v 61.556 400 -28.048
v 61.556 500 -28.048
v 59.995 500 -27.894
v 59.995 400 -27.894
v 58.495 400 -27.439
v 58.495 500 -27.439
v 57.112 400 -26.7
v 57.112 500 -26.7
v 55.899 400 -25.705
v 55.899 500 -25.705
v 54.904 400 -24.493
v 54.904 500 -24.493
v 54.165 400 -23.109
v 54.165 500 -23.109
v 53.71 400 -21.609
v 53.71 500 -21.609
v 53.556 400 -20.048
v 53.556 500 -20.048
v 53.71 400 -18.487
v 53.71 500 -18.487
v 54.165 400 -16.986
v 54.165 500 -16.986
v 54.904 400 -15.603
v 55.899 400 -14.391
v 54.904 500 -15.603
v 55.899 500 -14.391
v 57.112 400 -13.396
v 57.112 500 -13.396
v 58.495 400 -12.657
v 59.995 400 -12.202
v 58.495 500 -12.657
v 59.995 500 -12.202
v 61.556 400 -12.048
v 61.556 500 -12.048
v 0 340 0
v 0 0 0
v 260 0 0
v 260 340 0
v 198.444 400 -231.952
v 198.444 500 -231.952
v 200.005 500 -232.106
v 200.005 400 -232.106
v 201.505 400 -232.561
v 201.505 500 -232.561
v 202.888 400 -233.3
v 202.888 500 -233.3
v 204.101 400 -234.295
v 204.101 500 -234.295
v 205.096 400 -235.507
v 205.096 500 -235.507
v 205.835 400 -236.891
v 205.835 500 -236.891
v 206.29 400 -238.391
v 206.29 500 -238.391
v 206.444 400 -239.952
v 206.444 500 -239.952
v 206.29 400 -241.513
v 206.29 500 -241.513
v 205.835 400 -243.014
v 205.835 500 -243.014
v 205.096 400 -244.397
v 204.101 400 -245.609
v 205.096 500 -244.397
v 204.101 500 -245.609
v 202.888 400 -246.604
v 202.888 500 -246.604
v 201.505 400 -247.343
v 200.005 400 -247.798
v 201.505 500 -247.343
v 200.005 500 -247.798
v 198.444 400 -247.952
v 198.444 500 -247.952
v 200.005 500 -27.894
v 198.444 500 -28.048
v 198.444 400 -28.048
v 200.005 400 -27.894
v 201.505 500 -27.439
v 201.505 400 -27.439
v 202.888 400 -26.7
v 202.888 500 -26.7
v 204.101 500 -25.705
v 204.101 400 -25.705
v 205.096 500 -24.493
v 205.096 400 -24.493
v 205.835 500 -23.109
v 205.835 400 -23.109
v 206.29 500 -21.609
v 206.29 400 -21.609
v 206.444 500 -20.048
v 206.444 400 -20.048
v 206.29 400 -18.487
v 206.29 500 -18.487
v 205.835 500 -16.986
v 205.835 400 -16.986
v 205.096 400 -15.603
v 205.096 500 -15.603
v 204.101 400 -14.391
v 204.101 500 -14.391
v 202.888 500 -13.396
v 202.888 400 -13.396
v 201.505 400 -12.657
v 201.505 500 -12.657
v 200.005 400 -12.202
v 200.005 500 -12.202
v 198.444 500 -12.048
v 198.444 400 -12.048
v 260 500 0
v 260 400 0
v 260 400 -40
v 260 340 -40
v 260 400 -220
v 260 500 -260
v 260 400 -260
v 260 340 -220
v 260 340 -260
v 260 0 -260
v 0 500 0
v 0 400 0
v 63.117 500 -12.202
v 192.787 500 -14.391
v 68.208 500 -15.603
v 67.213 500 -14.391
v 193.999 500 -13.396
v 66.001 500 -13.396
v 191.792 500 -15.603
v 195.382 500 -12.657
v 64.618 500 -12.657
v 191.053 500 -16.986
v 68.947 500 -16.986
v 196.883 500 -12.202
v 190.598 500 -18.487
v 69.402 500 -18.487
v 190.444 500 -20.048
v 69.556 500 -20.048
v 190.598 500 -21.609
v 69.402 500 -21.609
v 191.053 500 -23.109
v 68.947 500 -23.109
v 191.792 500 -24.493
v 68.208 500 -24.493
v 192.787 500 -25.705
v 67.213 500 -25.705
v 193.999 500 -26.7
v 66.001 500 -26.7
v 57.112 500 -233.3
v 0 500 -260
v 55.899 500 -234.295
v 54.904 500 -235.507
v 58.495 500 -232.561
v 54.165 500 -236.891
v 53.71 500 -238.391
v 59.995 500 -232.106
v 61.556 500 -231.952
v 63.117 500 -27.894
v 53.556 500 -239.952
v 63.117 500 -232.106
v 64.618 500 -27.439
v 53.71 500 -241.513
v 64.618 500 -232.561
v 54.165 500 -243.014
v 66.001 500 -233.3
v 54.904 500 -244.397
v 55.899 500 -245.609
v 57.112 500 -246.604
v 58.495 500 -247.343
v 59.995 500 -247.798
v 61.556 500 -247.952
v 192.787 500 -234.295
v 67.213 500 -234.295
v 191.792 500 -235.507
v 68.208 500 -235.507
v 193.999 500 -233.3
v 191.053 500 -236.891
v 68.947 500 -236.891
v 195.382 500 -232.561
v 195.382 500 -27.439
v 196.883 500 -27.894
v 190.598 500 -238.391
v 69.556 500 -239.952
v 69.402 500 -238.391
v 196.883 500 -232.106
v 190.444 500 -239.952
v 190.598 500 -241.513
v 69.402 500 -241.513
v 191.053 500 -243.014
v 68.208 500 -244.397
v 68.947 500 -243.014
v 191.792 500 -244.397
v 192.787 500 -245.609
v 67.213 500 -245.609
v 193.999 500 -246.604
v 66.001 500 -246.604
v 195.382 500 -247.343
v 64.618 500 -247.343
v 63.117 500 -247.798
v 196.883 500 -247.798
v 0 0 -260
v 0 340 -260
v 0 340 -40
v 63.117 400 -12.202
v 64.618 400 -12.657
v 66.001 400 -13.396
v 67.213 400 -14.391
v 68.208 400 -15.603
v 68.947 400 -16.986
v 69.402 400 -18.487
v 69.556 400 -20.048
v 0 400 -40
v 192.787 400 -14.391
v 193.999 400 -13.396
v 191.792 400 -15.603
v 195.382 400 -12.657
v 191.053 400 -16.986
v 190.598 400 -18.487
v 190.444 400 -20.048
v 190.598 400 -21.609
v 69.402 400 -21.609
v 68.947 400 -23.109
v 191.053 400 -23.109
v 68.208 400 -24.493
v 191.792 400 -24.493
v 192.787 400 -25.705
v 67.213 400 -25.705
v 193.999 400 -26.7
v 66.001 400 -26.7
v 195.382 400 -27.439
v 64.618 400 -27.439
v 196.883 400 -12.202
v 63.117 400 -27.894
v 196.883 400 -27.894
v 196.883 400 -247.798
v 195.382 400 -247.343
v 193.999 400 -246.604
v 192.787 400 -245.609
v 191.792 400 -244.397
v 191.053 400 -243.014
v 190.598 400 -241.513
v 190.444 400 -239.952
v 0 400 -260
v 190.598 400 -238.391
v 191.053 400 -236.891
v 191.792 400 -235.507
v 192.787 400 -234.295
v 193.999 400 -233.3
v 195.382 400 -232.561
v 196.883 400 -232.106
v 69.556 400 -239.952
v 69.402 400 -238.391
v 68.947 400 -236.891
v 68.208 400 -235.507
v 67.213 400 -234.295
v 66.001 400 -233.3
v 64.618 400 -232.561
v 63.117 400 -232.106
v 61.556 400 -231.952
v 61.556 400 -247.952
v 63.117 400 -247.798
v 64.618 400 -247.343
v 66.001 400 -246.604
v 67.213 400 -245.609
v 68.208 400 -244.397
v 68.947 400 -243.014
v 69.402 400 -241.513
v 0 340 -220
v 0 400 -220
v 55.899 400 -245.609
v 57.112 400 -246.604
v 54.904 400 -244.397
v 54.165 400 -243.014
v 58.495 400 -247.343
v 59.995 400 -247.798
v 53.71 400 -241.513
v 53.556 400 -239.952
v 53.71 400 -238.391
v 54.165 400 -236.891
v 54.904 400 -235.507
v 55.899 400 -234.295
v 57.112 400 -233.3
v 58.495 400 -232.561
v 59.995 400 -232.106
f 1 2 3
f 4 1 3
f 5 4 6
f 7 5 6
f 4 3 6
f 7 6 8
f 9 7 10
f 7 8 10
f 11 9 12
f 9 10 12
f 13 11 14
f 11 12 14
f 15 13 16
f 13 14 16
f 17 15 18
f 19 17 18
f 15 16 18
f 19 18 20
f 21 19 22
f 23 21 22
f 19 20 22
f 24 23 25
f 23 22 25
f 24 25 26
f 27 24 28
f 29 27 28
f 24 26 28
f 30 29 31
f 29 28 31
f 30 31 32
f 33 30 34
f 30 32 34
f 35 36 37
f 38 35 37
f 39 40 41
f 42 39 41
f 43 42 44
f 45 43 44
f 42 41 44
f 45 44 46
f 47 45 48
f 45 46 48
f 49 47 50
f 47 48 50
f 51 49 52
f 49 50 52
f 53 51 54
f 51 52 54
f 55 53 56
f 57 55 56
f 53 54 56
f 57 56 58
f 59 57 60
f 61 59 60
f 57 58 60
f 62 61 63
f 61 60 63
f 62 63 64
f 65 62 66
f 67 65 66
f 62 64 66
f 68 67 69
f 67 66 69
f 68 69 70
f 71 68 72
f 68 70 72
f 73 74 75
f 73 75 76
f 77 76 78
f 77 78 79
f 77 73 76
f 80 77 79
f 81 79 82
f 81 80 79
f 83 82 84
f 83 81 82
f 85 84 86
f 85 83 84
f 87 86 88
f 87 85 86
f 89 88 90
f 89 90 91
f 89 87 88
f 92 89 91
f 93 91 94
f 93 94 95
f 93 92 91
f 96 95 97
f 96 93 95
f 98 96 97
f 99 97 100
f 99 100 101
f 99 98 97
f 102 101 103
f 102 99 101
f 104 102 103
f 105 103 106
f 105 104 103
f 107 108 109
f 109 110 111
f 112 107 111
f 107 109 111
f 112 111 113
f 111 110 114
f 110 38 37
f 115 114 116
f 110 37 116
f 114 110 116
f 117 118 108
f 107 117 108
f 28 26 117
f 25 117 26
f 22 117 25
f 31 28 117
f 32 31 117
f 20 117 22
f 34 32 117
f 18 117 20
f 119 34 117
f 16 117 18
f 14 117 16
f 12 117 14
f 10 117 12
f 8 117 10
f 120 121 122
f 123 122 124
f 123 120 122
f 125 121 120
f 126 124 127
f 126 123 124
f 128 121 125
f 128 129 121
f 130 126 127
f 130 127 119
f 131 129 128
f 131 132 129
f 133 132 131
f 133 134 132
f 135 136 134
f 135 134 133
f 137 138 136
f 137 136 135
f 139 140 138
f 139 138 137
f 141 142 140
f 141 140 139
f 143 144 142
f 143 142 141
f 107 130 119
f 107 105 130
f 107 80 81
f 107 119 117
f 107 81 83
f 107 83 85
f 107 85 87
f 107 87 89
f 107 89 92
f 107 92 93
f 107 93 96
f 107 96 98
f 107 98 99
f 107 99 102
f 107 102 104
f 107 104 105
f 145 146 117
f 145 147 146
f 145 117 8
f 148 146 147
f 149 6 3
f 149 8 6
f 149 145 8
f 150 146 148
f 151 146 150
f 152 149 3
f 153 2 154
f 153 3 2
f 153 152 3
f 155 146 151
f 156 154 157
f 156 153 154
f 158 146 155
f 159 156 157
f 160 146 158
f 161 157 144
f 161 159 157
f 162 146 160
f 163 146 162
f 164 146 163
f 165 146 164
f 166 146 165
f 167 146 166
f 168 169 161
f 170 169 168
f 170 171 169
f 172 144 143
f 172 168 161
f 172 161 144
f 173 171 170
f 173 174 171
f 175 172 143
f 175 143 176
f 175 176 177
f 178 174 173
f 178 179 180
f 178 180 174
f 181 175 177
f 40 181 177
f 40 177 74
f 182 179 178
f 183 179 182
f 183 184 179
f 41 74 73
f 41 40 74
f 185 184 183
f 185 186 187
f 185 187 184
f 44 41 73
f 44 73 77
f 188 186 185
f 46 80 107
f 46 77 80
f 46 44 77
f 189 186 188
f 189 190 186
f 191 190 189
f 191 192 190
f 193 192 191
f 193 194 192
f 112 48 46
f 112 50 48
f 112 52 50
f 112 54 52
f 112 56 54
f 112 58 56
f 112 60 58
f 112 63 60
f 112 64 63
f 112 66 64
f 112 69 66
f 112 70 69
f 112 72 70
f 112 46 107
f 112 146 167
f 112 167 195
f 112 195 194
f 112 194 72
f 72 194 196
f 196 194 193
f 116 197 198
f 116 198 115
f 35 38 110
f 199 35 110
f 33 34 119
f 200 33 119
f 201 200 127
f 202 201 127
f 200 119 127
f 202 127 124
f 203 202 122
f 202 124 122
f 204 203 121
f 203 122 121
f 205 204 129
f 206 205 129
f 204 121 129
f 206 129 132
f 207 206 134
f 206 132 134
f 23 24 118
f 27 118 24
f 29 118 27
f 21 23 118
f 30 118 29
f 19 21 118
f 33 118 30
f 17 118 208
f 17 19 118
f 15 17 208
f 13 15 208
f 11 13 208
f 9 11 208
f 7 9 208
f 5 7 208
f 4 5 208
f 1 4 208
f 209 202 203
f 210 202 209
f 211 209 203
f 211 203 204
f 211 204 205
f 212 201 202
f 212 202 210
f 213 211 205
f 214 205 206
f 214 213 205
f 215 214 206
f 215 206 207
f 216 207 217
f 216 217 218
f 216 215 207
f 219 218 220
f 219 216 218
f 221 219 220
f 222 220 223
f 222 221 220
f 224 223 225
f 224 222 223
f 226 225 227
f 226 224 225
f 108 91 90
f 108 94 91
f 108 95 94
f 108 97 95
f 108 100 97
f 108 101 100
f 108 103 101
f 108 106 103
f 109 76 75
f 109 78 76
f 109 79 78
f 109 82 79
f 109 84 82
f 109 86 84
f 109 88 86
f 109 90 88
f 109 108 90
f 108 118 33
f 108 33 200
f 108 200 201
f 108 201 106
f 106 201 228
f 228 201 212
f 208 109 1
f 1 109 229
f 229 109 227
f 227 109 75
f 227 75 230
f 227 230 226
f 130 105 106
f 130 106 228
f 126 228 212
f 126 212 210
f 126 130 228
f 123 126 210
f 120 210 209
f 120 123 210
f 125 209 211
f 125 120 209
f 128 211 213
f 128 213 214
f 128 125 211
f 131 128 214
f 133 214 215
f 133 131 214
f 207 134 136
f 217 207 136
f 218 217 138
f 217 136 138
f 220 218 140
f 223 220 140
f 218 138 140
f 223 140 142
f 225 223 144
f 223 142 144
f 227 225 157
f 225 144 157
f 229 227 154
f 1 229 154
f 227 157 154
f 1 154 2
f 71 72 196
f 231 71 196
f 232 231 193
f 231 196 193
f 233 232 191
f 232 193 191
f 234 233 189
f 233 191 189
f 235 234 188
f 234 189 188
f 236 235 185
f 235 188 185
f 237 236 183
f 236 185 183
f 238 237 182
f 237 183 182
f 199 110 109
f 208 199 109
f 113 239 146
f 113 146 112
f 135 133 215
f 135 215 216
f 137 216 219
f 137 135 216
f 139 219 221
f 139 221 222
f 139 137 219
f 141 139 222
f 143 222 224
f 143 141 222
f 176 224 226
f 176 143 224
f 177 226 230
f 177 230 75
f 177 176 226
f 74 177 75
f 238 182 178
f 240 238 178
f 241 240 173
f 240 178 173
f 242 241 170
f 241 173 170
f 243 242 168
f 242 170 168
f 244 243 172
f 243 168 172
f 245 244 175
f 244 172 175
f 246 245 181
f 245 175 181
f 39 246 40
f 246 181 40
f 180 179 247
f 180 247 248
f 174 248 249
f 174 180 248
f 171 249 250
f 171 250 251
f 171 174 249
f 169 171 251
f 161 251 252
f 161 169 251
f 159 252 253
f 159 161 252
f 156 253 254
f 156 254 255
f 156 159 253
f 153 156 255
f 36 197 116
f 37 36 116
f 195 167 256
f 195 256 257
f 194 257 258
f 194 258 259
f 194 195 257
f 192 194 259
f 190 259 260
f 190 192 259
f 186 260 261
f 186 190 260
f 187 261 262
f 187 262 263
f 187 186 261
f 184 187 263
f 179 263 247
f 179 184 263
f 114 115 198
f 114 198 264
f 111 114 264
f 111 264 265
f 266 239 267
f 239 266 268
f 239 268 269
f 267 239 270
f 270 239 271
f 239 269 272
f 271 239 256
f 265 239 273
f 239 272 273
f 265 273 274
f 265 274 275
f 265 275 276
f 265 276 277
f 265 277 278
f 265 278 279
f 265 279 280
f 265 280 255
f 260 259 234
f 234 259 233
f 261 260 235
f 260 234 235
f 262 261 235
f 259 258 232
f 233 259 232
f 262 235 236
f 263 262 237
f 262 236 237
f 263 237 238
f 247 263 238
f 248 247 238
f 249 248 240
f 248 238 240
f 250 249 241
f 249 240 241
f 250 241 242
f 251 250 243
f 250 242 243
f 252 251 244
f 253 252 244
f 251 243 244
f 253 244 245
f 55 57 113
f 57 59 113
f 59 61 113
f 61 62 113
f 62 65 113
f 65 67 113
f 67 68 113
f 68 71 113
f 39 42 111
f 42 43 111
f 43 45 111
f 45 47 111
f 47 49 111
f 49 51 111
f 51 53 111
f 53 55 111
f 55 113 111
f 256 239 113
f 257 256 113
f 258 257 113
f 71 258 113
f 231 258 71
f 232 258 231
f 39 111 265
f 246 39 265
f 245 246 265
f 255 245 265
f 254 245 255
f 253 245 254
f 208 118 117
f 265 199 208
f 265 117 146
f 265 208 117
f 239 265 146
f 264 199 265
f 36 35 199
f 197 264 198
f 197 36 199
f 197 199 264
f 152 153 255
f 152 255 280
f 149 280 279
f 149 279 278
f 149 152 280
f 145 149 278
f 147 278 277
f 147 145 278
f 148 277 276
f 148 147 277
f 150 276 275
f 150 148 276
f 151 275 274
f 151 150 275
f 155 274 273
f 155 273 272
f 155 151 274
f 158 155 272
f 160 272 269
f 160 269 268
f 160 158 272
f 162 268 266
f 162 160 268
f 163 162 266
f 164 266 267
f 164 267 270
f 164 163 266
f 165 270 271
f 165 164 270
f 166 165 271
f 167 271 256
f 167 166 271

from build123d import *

# Parameters (mm, degrees)
SKETCH2_W            = 260
SKETCH2_H            = 260
BOSS_EXTRUDE1_DEPTH  = 500
SKETCH4_W            = 40
SKETCH4_H            = 60
CUT_EXTRUDE1_DEPTH   = 621.644825967
CUT_EXTRUDE2_REACH   = 622.645
MIRROR2_COPY_1_REACH = 622.645


with BuildPart() as part:
    # Sketch2 → Boss-Extrude1 (new body)
    with BuildSketch(Plane(origin=(0, 0, 0), x_dir=(1, 0, 0), z_dir=(0, 1, 0))):
        with Locations((130, 130)):
            Rectangle(SKETCH2_W, SKETCH2_H)
    extrude(amount=BOSS_EXTRUDE1_DEPTH)

    # Sketch4 → Cut-Extrude1 (cut, symmetric)
    with BuildSketch(Plane(origin=(260, 0, 0), x_dir=(0, 0, -1), z_dir=(1, 0, 0))):
        with Locations((20, 370)):
            Rectangle(SKETCH4_W, SKETCH4_H)
    cut_extrude1 = extrude(amount=CUT_EXTRUDE1_DEPTH, both=True, mode=Mode.SUBTRACT)

    # Sketch5 → Cut-Extrude2 (cut, up to next)
    with BuildSketch(Plane(origin=(0, 500, 0), x_dir=(1, 0, 0), z_dir=(0, 1, 0)), mode=Mode.PRIVATE) as cut_extrude2_sk1:
        with BuildLine():
            ThreePointArc((69.556138468, 20.047965883), (67.212992718, 25.704820132), (61.556138468, 28.047965883))
            Line((61.556138468, 28.047965883), (61.556138468, 20.047965883))
            Line((61.556138468, 20.047965883), (61.556138468, 12.047965883))
            ThreePointArc((61.556138468, 12.047965883), (67.212992718, 14.391111633), (69.556138468, 20.047965883))
        make_face()
    cut_extrude2_tool1 = extrude(cut_extrude2_sk1.sketch, amount=-CUT_EXTRUDE2_REACH, mode=Mode.PRIVATE) & part.part
    # Sketch5 → Cut-Extrude2 (cut, up to next)
    with BuildSketch(Plane(origin=(0, 500, 0), x_dir=(1, 0, 0), z_dir=(0, 1, 0)), mode=Mode.PRIVATE) as cut_extrude2_sk2:
        with BuildLine():
            Line((61.556138468, 20.047965883), (61.556138468, 28.047965883))
            ThreePointArc((61.556138468, 28.047965883), (53.556138468, 20.047965883), (61.556138468, 12.047965883))
            Line((61.556138468, 12.047965883), (61.556138468, 20.047965883))
        make_face()
    cut_extrude2_tool2 = extrude(cut_extrude2_sk2.sketch, amount=-CUT_EXTRUDE2_REACH, mode=Mode.PRIVATE) & part.part
    # Sketch5 → Cut-Extrude2 (cut, up to next)
    with BuildSketch(Plane(origin=(0, 500, 0), x_dir=(1, 0, 0), z_dir=(0, 1, 0)), mode=Mode.PRIVATE) as cut_extrude2_sk3:
        with BuildLine():
            ThreePointArc((69.556138468, 20.047965883), (67.212992718, 25.704820132), (61.556138468, 28.047965883))
            Line((61.556138468, 28.047965883), (61.556138468, 20.047965883))
            Line((61.556138468, 20.047965883), (61.556138468, 12.047965883))
            ThreePointArc((61.556138468, 12.047965883), (67.212992718, 14.391111633), (69.556138468, 20.047965883))
        make_face()
    cut_extrude2_tool3 = extrude(cut_extrude2_sk3.sketch, amount=-CUT_EXTRUDE2_REACH, mode=Mode.PRIVATE) & part.part
    # Sketch5 → Cut-Extrude2 (cut, up to next)
    with BuildSketch(Plane(origin=(0, 500, 0), x_dir=(1, 0, 0), z_dir=(0, 1, 0)), mode=Mode.PRIVATE) as cut_extrude2_sk4:
        with BuildLine():
            Line((61.556138468, 20.047965883), (61.556138468, 28.047965883))
            ThreePointArc((61.556138468, 28.047965883), (53.556138468, 20.047965883), (61.556138468, 12.047965883))
            Line((61.556138468, 12.047965883), (61.556138468, 20.047965883))
        make_face()
    cut_extrude2_tool4 = extrude(cut_extrude2_sk4.sketch, amount=-CUT_EXTRUDE2_REACH, mode=Mode.PRIVATE) & part.part
    cut_extrude2_1 = cut_extrude2_tool1.solids().sort_by_distance((64.951444, 500, -20.047966))[0]
    add(cut_extrude2_1, mode=Mode.SUBTRACT)
    cut_extrude2_2 = cut_extrude2_tool2.solids().sort_by_distance((58.160833, 500, -20.047966))[0]
    add(cut_extrude2_2, mode=Mode.SUBTRACT)
    cut_extrude2_3 = cut_extrude2_tool3.solids().sort_by_distance((64.951444, 500, -20.047966))[0]
    add(cut_extrude2_3, mode=Mode.SUBTRACT)
    cut_extrude2_4 = cut_extrude2_tool4.solids().sort_by_distance((58.160833, 500, -20.047966))[0]
    add(cut_extrude2_4, mode=Mode.SUBTRACT)
    cut_extrude2 = cut_extrude2_1 + cut_extrude2_2 + cut_extrude2_3 + cut_extrude2_4  # Cut-Extrude2 as one shape, for the pattern or mirror that repeats it

    # Mirror1: Cut-Extrude2 across plane
    add(cut_extrude2.mirror(Plane.ZY.offset(-130)), mode=Mode.SUBTRACT)

    # Mirror2: Cut-Extrude1, Cut-Extrude2 across plane
    add(cut_extrude1.mirror(Plane(origin=(0, 0, -130), x_dir=(1, 0, 0), z_dir=(0, 0, -1))), mode=Mode.SUBTRACT)
    add(cut_extrude2.mirror(Plane(origin=(0, 0, -130), x_dir=(1, 0, 0), z_dir=(0, 0, -1))), mode=Mode.SUBTRACT)

    # Mirror2 copy 1 sketch → Mirror2 copy 1 (cut, up to next)
    with BuildSketch(Plane(origin=(260, 500, -260), x_dir=(-1, 0, 0), z_dir=(0, 1, 0)), mode=Mode.PRIVATE) as mirror2_copy_1_sk1:
        with BuildLine():
            ThreePointArc((69.556138468, 20.047965883), (67.212992718, 25.704820132), (61.556138468, 28.047965883))
            Line((61.556138468, 28.047965883), (61.556138468, 20.047965883))
            Line((61.556138468, 20.047965883), (61.556138468, 12.047965883))
            ThreePointArc((61.556138468, 12.047965883), (67.212992718, 14.391111633), (69.556138468, 20.047965883))
        make_face()
    mirror2_copy_1_tool1 = extrude(mirror2_copy_1_sk1.sketch, amount=-MIRROR2_COPY_1_REACH, mode=Mode.PRIVATE) & part.part
    # Mirror2 copy 1 sketch → Mirror2 copy 1 (cut, up to next)
    with BuildSketch(Plane(origin=(260, 500, -260), x_dir=(-1, 0, 0), z_dir=(0, 1, 0)), mode=Mode.PRIVATE) as mirror2_copy_1_sk2:
        with BuildLine():
            Line((61.556138468, 20.047965883), (61.556138468, 28.047965883))
            ThreePointArc((61.556138468, 28.047965883), (53.556138468, 20.047965883), (61.556138468, 12.047965883))
            Line((61.556138468, 12.047965883), (61.556138468, 20.047965883))
        make_face()
    mirror2_copy_1_tool2 = extrude(mirror2_copy_1_sk2.sketch, amount=-MIRROR2_COPY_1_REACH, mode=Mode.PRIVATE) & part.part
    # Mirror2 copy 1 sketch → Mirror2 copy 1 (cut, up to next)
    with BuildSketch(Plane(origin=(260, 500, -260), x_dir=(-1, 0, 0), z_dir=(0, 1, 0)), mode=Mode.PRIVATE) as mirror2_copy_1_sk3:
        with BuildLine():
            ThreePointArc((69.556138468, 20.047965883), (67.212992718, 25.704820132), (61.556138468, 28.047965883))
            Line((61.556138468, 28.047965883), (61.556138468, 20.047965883))
            Line((61.556138468, 20.047965883), (61.556138468, 12.047965883))
            ThreePointArc((61.556138468, 12.047965883), (67.212992718, 14.391111633), (69.556138468, 20.047965883))
        make_face()
    mirror2_copy_1_tool3 = extrude(mirror2_copy_1_sk3.sketch, amount=-MIRROR2_COPY_1_REACH, mode=Mode.PRIVATE) & part.part
    # Mirror2 copy 1 sketch → Mirror2 copy 1 (cut, up to next)
    with BuildSketch(Plane(origin=(260, 500, -260), x_dir=(-1, 0, 0), z_dir=(0, 1, 0)), mode=Mode.PRIVATE) as mirror2_copy_1_sk4:
        with BuildLine():
            Line((61.556138468, 20.047965883), (61.556138468, 28.047965883))
            ThreePointArc((61.556138468, 28.047965883), (53.556138468, 20.047965883), (61.556138468, 12.047965883))
            Line((61.556138468, 12.047965883), (61.556138468, 20.047965883))
        make_face()
    mirror2_copy_1_tool4 = extrude(mirror2_copy_1_sk4.sketch, amount=-MIRROR2_COPY_1_REACH, mode=Mode.PRIVATE) & part.part
    add(mirror2_copy_1_tool1.solids().sort_by_distance((195.048556, 500, -239.952034))[0], mode=Mode.SUBTRACT)
    add(mirror2_copy_1_tool2.solids().sort_by_distance((201.839167, 500, -239.952034))[0], mode=Mode.SUBTRACT)
    add(mirror2_copy_1_tool3.solids().sort_by_distance((195.048556, 500, -239.952034))[0], mode=Mode.SUBTRACT)
    add(mirror2_copy_1_tool4.solids().sort_by_distance((201.839167, 500, -239.952034))[0], mode=Mode.SUBTRACT)


solid = part.part
